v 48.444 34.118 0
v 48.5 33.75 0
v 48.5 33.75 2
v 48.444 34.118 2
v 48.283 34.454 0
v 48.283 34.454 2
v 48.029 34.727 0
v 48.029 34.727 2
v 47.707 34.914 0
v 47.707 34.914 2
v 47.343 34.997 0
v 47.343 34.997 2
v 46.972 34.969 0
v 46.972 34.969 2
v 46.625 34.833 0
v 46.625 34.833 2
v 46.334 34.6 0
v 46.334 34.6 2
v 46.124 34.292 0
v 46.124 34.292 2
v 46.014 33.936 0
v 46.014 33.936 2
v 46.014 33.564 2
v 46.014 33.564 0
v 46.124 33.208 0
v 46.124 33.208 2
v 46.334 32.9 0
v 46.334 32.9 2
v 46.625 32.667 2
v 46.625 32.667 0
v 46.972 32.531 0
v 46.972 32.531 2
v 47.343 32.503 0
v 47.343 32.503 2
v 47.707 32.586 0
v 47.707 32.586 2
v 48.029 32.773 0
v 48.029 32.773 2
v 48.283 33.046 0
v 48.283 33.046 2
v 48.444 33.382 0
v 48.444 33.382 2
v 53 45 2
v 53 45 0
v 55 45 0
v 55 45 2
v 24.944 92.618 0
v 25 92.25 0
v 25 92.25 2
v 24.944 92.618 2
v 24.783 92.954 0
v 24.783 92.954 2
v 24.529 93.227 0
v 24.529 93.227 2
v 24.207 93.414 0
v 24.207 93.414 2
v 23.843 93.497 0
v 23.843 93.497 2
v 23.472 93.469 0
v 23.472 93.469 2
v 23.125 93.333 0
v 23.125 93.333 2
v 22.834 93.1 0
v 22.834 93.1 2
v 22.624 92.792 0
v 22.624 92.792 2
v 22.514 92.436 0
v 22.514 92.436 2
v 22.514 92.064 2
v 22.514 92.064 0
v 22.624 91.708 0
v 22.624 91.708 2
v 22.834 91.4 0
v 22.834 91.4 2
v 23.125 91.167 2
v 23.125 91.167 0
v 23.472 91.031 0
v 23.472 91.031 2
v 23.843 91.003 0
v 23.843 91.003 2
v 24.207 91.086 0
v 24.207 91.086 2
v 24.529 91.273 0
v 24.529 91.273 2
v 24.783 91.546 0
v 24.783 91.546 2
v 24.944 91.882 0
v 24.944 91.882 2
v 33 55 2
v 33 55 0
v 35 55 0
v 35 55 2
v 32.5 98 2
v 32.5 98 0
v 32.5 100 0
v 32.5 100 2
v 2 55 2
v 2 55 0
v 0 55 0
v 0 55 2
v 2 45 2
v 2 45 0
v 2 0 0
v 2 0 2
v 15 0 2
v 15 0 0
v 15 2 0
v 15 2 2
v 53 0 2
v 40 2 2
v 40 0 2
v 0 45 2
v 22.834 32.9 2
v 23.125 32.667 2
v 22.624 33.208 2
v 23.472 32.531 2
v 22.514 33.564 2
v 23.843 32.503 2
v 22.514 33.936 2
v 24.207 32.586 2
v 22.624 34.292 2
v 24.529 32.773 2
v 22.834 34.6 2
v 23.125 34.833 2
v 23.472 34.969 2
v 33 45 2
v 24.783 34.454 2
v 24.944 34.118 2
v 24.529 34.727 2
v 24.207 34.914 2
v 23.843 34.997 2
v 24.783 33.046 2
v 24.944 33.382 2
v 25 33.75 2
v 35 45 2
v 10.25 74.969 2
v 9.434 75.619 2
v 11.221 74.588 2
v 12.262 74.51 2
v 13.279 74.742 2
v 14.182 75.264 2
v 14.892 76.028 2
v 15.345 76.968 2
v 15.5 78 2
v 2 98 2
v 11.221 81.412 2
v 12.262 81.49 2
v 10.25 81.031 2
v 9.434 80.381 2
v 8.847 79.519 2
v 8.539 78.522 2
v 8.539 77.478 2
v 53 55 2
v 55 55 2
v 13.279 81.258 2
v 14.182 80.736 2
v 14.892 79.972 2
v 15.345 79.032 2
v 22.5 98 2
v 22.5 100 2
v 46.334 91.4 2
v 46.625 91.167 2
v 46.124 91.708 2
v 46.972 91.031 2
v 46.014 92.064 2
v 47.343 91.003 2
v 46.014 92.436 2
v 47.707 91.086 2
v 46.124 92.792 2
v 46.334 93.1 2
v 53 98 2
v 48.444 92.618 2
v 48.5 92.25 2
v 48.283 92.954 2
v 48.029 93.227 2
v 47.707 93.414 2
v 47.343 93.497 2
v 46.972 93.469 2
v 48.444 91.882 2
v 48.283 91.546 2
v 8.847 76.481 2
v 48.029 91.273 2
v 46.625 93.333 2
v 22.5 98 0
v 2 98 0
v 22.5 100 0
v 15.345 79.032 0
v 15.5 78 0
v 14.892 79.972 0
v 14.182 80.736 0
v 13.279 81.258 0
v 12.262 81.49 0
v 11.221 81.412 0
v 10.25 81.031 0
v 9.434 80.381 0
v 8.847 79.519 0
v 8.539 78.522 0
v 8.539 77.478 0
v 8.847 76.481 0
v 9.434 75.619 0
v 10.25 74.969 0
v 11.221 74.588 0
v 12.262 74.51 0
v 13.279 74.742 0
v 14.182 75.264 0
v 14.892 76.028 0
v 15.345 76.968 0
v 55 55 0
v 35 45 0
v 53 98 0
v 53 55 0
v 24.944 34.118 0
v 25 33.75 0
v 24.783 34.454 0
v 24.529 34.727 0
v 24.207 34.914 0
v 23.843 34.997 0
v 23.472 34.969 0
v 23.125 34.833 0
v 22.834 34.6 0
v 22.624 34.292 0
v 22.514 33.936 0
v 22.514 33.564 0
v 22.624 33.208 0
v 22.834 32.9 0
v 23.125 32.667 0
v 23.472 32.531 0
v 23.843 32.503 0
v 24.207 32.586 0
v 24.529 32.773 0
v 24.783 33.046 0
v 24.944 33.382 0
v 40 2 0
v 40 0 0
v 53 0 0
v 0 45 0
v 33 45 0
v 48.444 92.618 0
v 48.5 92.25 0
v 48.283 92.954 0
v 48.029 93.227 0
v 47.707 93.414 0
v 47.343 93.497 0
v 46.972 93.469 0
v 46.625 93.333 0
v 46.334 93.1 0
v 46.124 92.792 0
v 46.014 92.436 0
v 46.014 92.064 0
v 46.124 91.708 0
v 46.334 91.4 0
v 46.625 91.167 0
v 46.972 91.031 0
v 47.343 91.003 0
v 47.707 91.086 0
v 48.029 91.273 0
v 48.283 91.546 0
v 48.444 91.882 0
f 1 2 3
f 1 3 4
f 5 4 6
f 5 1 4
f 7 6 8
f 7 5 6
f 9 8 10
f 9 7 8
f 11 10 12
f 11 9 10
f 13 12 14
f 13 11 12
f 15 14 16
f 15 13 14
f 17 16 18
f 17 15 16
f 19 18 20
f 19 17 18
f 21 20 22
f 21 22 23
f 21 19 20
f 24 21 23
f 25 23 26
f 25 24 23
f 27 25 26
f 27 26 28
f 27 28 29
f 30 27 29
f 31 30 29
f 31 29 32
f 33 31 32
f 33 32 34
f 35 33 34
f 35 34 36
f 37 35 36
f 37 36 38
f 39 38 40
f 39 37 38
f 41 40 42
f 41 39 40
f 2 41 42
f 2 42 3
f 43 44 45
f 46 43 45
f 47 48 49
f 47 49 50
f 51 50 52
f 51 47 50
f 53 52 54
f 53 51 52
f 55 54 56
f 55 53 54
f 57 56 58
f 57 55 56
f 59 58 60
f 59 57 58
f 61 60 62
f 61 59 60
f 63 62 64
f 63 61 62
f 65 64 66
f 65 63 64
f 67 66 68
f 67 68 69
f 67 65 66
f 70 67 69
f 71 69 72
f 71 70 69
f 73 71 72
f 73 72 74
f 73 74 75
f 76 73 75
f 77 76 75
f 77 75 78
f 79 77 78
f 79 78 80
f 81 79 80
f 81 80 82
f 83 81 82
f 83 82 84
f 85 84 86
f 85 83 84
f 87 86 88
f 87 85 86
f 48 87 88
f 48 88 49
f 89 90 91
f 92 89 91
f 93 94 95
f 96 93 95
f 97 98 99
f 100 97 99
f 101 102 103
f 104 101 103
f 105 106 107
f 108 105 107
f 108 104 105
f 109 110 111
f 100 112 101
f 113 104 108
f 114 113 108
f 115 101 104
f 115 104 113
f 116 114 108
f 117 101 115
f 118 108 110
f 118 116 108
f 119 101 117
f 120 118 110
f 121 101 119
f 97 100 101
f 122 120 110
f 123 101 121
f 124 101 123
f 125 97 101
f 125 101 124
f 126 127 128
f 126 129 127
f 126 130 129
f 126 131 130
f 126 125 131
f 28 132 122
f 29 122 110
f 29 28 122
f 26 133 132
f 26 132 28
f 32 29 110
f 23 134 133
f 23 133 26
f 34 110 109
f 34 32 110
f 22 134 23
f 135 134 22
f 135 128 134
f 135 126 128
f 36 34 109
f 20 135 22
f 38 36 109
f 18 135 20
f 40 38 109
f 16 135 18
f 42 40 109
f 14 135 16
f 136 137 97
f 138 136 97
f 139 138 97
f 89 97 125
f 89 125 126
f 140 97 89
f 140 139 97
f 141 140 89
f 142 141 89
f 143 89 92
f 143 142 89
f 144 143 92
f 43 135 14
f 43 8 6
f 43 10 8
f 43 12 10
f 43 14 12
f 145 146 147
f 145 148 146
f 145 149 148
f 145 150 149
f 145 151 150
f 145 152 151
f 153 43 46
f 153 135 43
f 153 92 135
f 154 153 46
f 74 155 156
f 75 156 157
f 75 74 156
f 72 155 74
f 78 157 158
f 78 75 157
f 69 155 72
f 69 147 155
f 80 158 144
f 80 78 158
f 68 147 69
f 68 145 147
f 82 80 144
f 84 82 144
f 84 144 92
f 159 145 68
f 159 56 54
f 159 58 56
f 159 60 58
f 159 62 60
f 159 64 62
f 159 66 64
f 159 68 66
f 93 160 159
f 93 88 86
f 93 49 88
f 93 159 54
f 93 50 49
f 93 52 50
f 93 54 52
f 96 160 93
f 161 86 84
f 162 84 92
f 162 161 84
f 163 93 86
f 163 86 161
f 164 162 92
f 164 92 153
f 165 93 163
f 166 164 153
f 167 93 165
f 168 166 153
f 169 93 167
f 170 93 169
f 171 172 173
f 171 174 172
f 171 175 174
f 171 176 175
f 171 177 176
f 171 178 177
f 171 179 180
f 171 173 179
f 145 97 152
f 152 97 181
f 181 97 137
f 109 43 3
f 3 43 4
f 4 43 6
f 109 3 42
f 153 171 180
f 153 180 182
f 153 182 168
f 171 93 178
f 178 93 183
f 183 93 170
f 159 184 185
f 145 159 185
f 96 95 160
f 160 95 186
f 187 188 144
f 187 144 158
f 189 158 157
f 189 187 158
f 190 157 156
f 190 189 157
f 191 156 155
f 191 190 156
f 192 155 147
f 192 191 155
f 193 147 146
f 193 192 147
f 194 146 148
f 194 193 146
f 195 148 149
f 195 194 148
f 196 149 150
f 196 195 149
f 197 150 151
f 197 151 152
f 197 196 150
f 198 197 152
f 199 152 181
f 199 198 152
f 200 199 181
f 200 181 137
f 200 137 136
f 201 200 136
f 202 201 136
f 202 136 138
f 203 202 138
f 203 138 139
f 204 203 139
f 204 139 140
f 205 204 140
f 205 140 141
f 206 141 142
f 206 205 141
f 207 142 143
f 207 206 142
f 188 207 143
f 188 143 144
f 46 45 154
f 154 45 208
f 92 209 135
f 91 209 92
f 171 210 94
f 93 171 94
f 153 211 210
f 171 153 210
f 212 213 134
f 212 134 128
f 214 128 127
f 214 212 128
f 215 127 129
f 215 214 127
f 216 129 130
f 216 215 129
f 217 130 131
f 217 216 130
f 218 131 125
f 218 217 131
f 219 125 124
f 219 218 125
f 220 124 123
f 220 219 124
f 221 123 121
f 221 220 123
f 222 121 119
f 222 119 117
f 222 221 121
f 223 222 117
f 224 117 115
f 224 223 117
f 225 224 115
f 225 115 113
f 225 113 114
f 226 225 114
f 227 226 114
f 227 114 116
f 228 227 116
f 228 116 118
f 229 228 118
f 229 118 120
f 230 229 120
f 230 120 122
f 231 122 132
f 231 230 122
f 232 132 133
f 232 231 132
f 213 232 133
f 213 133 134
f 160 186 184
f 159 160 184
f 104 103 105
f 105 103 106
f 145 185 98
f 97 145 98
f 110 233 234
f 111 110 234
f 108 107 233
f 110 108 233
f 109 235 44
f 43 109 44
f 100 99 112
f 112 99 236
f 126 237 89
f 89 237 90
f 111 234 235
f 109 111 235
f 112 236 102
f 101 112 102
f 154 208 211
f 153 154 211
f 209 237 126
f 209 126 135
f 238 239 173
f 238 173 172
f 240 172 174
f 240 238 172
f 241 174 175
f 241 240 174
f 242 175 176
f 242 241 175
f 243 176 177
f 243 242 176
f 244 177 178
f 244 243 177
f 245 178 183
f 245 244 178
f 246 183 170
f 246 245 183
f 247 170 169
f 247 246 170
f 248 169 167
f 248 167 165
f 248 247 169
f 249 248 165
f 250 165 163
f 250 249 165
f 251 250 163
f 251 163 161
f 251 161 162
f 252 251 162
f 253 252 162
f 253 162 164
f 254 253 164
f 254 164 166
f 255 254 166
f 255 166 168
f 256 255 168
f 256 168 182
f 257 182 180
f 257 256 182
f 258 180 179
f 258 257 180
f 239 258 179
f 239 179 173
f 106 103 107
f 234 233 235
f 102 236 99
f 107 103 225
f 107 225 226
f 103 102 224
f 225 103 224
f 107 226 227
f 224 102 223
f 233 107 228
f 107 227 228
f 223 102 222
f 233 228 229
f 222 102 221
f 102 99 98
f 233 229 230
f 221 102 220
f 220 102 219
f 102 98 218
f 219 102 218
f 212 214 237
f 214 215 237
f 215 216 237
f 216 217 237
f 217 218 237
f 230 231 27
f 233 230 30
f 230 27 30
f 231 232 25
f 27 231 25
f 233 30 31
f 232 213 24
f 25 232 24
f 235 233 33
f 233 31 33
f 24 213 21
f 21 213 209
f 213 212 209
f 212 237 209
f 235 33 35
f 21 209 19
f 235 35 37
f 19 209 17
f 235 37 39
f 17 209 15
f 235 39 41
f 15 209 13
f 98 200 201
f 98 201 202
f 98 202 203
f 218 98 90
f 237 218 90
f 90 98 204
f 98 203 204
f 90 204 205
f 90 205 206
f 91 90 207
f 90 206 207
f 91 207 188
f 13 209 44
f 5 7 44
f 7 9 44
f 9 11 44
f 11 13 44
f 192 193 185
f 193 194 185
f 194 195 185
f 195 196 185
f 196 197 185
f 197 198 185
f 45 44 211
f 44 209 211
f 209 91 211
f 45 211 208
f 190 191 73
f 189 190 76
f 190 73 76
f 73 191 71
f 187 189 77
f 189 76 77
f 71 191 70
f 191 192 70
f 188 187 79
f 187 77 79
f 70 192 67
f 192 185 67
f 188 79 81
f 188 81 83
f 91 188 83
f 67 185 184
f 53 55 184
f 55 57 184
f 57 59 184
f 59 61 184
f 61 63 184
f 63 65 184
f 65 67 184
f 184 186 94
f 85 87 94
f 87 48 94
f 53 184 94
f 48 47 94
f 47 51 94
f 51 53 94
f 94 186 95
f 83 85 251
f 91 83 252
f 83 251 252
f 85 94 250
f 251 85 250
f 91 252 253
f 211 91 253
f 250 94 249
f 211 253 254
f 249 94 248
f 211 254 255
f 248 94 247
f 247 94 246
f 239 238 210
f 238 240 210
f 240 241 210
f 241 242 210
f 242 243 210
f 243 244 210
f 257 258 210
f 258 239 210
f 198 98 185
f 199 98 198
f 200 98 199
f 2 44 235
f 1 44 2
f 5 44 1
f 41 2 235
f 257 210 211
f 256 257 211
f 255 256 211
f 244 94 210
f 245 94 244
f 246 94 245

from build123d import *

# Parameters (mm, degrees)
SKETCH1_R           = 1.25
SKETCH1_R_2         = 3.5
SKETCH1_W           = 2
SKETCH1_H           = 10
BOSS_EXTRUDE1_DEPTH = 2


with BuildPart() as part:
    # Sketch1 → Boss-Extrude1 (new body)
    with BuildSketch(Plane.XY):
        Polygon((22.5, 100), (22.5, 98), (2, 98), (2, 55), (0, 55), (0, 45), (2, 45), (2, 0), (15, 0), (15, 2), (40, 2), (40, 0), (53, 0), (53, 45), (55, 45), (55, 55), (53, 55), (53, 98), (32.5, 98), (32.5, 100), align=None)
        with Locations((47.25, 92.25)):
            Circle(SKETCH1_R, mode=Mode.SUBTRACT)
        with Locations((23.75, 92.25)):
            Circle(SKETCH1_R, mode=Mode.SUBTRACT)
        with Locations((47.25, 33.75)):
            Circle(SKETCH1_R, mode=Mode.SUBTRACT)
        with Locations((23.75, 33.75)):
            Circle(SKETCH1_R, mode=Mode.SUBTRACT)
        with Locations((12, 78)):
            Circle(SKETCH1_R_2, mode=Mode.SUBTRACT)
        with Locations((34, 50)):
            Rectangle(SKETCH1_W, SKETCH1_H, mode=Mode.SUBTRACT)
    extrude(amount=BOSS_EXTRUDE1_DEPTH)


solid = part.part
